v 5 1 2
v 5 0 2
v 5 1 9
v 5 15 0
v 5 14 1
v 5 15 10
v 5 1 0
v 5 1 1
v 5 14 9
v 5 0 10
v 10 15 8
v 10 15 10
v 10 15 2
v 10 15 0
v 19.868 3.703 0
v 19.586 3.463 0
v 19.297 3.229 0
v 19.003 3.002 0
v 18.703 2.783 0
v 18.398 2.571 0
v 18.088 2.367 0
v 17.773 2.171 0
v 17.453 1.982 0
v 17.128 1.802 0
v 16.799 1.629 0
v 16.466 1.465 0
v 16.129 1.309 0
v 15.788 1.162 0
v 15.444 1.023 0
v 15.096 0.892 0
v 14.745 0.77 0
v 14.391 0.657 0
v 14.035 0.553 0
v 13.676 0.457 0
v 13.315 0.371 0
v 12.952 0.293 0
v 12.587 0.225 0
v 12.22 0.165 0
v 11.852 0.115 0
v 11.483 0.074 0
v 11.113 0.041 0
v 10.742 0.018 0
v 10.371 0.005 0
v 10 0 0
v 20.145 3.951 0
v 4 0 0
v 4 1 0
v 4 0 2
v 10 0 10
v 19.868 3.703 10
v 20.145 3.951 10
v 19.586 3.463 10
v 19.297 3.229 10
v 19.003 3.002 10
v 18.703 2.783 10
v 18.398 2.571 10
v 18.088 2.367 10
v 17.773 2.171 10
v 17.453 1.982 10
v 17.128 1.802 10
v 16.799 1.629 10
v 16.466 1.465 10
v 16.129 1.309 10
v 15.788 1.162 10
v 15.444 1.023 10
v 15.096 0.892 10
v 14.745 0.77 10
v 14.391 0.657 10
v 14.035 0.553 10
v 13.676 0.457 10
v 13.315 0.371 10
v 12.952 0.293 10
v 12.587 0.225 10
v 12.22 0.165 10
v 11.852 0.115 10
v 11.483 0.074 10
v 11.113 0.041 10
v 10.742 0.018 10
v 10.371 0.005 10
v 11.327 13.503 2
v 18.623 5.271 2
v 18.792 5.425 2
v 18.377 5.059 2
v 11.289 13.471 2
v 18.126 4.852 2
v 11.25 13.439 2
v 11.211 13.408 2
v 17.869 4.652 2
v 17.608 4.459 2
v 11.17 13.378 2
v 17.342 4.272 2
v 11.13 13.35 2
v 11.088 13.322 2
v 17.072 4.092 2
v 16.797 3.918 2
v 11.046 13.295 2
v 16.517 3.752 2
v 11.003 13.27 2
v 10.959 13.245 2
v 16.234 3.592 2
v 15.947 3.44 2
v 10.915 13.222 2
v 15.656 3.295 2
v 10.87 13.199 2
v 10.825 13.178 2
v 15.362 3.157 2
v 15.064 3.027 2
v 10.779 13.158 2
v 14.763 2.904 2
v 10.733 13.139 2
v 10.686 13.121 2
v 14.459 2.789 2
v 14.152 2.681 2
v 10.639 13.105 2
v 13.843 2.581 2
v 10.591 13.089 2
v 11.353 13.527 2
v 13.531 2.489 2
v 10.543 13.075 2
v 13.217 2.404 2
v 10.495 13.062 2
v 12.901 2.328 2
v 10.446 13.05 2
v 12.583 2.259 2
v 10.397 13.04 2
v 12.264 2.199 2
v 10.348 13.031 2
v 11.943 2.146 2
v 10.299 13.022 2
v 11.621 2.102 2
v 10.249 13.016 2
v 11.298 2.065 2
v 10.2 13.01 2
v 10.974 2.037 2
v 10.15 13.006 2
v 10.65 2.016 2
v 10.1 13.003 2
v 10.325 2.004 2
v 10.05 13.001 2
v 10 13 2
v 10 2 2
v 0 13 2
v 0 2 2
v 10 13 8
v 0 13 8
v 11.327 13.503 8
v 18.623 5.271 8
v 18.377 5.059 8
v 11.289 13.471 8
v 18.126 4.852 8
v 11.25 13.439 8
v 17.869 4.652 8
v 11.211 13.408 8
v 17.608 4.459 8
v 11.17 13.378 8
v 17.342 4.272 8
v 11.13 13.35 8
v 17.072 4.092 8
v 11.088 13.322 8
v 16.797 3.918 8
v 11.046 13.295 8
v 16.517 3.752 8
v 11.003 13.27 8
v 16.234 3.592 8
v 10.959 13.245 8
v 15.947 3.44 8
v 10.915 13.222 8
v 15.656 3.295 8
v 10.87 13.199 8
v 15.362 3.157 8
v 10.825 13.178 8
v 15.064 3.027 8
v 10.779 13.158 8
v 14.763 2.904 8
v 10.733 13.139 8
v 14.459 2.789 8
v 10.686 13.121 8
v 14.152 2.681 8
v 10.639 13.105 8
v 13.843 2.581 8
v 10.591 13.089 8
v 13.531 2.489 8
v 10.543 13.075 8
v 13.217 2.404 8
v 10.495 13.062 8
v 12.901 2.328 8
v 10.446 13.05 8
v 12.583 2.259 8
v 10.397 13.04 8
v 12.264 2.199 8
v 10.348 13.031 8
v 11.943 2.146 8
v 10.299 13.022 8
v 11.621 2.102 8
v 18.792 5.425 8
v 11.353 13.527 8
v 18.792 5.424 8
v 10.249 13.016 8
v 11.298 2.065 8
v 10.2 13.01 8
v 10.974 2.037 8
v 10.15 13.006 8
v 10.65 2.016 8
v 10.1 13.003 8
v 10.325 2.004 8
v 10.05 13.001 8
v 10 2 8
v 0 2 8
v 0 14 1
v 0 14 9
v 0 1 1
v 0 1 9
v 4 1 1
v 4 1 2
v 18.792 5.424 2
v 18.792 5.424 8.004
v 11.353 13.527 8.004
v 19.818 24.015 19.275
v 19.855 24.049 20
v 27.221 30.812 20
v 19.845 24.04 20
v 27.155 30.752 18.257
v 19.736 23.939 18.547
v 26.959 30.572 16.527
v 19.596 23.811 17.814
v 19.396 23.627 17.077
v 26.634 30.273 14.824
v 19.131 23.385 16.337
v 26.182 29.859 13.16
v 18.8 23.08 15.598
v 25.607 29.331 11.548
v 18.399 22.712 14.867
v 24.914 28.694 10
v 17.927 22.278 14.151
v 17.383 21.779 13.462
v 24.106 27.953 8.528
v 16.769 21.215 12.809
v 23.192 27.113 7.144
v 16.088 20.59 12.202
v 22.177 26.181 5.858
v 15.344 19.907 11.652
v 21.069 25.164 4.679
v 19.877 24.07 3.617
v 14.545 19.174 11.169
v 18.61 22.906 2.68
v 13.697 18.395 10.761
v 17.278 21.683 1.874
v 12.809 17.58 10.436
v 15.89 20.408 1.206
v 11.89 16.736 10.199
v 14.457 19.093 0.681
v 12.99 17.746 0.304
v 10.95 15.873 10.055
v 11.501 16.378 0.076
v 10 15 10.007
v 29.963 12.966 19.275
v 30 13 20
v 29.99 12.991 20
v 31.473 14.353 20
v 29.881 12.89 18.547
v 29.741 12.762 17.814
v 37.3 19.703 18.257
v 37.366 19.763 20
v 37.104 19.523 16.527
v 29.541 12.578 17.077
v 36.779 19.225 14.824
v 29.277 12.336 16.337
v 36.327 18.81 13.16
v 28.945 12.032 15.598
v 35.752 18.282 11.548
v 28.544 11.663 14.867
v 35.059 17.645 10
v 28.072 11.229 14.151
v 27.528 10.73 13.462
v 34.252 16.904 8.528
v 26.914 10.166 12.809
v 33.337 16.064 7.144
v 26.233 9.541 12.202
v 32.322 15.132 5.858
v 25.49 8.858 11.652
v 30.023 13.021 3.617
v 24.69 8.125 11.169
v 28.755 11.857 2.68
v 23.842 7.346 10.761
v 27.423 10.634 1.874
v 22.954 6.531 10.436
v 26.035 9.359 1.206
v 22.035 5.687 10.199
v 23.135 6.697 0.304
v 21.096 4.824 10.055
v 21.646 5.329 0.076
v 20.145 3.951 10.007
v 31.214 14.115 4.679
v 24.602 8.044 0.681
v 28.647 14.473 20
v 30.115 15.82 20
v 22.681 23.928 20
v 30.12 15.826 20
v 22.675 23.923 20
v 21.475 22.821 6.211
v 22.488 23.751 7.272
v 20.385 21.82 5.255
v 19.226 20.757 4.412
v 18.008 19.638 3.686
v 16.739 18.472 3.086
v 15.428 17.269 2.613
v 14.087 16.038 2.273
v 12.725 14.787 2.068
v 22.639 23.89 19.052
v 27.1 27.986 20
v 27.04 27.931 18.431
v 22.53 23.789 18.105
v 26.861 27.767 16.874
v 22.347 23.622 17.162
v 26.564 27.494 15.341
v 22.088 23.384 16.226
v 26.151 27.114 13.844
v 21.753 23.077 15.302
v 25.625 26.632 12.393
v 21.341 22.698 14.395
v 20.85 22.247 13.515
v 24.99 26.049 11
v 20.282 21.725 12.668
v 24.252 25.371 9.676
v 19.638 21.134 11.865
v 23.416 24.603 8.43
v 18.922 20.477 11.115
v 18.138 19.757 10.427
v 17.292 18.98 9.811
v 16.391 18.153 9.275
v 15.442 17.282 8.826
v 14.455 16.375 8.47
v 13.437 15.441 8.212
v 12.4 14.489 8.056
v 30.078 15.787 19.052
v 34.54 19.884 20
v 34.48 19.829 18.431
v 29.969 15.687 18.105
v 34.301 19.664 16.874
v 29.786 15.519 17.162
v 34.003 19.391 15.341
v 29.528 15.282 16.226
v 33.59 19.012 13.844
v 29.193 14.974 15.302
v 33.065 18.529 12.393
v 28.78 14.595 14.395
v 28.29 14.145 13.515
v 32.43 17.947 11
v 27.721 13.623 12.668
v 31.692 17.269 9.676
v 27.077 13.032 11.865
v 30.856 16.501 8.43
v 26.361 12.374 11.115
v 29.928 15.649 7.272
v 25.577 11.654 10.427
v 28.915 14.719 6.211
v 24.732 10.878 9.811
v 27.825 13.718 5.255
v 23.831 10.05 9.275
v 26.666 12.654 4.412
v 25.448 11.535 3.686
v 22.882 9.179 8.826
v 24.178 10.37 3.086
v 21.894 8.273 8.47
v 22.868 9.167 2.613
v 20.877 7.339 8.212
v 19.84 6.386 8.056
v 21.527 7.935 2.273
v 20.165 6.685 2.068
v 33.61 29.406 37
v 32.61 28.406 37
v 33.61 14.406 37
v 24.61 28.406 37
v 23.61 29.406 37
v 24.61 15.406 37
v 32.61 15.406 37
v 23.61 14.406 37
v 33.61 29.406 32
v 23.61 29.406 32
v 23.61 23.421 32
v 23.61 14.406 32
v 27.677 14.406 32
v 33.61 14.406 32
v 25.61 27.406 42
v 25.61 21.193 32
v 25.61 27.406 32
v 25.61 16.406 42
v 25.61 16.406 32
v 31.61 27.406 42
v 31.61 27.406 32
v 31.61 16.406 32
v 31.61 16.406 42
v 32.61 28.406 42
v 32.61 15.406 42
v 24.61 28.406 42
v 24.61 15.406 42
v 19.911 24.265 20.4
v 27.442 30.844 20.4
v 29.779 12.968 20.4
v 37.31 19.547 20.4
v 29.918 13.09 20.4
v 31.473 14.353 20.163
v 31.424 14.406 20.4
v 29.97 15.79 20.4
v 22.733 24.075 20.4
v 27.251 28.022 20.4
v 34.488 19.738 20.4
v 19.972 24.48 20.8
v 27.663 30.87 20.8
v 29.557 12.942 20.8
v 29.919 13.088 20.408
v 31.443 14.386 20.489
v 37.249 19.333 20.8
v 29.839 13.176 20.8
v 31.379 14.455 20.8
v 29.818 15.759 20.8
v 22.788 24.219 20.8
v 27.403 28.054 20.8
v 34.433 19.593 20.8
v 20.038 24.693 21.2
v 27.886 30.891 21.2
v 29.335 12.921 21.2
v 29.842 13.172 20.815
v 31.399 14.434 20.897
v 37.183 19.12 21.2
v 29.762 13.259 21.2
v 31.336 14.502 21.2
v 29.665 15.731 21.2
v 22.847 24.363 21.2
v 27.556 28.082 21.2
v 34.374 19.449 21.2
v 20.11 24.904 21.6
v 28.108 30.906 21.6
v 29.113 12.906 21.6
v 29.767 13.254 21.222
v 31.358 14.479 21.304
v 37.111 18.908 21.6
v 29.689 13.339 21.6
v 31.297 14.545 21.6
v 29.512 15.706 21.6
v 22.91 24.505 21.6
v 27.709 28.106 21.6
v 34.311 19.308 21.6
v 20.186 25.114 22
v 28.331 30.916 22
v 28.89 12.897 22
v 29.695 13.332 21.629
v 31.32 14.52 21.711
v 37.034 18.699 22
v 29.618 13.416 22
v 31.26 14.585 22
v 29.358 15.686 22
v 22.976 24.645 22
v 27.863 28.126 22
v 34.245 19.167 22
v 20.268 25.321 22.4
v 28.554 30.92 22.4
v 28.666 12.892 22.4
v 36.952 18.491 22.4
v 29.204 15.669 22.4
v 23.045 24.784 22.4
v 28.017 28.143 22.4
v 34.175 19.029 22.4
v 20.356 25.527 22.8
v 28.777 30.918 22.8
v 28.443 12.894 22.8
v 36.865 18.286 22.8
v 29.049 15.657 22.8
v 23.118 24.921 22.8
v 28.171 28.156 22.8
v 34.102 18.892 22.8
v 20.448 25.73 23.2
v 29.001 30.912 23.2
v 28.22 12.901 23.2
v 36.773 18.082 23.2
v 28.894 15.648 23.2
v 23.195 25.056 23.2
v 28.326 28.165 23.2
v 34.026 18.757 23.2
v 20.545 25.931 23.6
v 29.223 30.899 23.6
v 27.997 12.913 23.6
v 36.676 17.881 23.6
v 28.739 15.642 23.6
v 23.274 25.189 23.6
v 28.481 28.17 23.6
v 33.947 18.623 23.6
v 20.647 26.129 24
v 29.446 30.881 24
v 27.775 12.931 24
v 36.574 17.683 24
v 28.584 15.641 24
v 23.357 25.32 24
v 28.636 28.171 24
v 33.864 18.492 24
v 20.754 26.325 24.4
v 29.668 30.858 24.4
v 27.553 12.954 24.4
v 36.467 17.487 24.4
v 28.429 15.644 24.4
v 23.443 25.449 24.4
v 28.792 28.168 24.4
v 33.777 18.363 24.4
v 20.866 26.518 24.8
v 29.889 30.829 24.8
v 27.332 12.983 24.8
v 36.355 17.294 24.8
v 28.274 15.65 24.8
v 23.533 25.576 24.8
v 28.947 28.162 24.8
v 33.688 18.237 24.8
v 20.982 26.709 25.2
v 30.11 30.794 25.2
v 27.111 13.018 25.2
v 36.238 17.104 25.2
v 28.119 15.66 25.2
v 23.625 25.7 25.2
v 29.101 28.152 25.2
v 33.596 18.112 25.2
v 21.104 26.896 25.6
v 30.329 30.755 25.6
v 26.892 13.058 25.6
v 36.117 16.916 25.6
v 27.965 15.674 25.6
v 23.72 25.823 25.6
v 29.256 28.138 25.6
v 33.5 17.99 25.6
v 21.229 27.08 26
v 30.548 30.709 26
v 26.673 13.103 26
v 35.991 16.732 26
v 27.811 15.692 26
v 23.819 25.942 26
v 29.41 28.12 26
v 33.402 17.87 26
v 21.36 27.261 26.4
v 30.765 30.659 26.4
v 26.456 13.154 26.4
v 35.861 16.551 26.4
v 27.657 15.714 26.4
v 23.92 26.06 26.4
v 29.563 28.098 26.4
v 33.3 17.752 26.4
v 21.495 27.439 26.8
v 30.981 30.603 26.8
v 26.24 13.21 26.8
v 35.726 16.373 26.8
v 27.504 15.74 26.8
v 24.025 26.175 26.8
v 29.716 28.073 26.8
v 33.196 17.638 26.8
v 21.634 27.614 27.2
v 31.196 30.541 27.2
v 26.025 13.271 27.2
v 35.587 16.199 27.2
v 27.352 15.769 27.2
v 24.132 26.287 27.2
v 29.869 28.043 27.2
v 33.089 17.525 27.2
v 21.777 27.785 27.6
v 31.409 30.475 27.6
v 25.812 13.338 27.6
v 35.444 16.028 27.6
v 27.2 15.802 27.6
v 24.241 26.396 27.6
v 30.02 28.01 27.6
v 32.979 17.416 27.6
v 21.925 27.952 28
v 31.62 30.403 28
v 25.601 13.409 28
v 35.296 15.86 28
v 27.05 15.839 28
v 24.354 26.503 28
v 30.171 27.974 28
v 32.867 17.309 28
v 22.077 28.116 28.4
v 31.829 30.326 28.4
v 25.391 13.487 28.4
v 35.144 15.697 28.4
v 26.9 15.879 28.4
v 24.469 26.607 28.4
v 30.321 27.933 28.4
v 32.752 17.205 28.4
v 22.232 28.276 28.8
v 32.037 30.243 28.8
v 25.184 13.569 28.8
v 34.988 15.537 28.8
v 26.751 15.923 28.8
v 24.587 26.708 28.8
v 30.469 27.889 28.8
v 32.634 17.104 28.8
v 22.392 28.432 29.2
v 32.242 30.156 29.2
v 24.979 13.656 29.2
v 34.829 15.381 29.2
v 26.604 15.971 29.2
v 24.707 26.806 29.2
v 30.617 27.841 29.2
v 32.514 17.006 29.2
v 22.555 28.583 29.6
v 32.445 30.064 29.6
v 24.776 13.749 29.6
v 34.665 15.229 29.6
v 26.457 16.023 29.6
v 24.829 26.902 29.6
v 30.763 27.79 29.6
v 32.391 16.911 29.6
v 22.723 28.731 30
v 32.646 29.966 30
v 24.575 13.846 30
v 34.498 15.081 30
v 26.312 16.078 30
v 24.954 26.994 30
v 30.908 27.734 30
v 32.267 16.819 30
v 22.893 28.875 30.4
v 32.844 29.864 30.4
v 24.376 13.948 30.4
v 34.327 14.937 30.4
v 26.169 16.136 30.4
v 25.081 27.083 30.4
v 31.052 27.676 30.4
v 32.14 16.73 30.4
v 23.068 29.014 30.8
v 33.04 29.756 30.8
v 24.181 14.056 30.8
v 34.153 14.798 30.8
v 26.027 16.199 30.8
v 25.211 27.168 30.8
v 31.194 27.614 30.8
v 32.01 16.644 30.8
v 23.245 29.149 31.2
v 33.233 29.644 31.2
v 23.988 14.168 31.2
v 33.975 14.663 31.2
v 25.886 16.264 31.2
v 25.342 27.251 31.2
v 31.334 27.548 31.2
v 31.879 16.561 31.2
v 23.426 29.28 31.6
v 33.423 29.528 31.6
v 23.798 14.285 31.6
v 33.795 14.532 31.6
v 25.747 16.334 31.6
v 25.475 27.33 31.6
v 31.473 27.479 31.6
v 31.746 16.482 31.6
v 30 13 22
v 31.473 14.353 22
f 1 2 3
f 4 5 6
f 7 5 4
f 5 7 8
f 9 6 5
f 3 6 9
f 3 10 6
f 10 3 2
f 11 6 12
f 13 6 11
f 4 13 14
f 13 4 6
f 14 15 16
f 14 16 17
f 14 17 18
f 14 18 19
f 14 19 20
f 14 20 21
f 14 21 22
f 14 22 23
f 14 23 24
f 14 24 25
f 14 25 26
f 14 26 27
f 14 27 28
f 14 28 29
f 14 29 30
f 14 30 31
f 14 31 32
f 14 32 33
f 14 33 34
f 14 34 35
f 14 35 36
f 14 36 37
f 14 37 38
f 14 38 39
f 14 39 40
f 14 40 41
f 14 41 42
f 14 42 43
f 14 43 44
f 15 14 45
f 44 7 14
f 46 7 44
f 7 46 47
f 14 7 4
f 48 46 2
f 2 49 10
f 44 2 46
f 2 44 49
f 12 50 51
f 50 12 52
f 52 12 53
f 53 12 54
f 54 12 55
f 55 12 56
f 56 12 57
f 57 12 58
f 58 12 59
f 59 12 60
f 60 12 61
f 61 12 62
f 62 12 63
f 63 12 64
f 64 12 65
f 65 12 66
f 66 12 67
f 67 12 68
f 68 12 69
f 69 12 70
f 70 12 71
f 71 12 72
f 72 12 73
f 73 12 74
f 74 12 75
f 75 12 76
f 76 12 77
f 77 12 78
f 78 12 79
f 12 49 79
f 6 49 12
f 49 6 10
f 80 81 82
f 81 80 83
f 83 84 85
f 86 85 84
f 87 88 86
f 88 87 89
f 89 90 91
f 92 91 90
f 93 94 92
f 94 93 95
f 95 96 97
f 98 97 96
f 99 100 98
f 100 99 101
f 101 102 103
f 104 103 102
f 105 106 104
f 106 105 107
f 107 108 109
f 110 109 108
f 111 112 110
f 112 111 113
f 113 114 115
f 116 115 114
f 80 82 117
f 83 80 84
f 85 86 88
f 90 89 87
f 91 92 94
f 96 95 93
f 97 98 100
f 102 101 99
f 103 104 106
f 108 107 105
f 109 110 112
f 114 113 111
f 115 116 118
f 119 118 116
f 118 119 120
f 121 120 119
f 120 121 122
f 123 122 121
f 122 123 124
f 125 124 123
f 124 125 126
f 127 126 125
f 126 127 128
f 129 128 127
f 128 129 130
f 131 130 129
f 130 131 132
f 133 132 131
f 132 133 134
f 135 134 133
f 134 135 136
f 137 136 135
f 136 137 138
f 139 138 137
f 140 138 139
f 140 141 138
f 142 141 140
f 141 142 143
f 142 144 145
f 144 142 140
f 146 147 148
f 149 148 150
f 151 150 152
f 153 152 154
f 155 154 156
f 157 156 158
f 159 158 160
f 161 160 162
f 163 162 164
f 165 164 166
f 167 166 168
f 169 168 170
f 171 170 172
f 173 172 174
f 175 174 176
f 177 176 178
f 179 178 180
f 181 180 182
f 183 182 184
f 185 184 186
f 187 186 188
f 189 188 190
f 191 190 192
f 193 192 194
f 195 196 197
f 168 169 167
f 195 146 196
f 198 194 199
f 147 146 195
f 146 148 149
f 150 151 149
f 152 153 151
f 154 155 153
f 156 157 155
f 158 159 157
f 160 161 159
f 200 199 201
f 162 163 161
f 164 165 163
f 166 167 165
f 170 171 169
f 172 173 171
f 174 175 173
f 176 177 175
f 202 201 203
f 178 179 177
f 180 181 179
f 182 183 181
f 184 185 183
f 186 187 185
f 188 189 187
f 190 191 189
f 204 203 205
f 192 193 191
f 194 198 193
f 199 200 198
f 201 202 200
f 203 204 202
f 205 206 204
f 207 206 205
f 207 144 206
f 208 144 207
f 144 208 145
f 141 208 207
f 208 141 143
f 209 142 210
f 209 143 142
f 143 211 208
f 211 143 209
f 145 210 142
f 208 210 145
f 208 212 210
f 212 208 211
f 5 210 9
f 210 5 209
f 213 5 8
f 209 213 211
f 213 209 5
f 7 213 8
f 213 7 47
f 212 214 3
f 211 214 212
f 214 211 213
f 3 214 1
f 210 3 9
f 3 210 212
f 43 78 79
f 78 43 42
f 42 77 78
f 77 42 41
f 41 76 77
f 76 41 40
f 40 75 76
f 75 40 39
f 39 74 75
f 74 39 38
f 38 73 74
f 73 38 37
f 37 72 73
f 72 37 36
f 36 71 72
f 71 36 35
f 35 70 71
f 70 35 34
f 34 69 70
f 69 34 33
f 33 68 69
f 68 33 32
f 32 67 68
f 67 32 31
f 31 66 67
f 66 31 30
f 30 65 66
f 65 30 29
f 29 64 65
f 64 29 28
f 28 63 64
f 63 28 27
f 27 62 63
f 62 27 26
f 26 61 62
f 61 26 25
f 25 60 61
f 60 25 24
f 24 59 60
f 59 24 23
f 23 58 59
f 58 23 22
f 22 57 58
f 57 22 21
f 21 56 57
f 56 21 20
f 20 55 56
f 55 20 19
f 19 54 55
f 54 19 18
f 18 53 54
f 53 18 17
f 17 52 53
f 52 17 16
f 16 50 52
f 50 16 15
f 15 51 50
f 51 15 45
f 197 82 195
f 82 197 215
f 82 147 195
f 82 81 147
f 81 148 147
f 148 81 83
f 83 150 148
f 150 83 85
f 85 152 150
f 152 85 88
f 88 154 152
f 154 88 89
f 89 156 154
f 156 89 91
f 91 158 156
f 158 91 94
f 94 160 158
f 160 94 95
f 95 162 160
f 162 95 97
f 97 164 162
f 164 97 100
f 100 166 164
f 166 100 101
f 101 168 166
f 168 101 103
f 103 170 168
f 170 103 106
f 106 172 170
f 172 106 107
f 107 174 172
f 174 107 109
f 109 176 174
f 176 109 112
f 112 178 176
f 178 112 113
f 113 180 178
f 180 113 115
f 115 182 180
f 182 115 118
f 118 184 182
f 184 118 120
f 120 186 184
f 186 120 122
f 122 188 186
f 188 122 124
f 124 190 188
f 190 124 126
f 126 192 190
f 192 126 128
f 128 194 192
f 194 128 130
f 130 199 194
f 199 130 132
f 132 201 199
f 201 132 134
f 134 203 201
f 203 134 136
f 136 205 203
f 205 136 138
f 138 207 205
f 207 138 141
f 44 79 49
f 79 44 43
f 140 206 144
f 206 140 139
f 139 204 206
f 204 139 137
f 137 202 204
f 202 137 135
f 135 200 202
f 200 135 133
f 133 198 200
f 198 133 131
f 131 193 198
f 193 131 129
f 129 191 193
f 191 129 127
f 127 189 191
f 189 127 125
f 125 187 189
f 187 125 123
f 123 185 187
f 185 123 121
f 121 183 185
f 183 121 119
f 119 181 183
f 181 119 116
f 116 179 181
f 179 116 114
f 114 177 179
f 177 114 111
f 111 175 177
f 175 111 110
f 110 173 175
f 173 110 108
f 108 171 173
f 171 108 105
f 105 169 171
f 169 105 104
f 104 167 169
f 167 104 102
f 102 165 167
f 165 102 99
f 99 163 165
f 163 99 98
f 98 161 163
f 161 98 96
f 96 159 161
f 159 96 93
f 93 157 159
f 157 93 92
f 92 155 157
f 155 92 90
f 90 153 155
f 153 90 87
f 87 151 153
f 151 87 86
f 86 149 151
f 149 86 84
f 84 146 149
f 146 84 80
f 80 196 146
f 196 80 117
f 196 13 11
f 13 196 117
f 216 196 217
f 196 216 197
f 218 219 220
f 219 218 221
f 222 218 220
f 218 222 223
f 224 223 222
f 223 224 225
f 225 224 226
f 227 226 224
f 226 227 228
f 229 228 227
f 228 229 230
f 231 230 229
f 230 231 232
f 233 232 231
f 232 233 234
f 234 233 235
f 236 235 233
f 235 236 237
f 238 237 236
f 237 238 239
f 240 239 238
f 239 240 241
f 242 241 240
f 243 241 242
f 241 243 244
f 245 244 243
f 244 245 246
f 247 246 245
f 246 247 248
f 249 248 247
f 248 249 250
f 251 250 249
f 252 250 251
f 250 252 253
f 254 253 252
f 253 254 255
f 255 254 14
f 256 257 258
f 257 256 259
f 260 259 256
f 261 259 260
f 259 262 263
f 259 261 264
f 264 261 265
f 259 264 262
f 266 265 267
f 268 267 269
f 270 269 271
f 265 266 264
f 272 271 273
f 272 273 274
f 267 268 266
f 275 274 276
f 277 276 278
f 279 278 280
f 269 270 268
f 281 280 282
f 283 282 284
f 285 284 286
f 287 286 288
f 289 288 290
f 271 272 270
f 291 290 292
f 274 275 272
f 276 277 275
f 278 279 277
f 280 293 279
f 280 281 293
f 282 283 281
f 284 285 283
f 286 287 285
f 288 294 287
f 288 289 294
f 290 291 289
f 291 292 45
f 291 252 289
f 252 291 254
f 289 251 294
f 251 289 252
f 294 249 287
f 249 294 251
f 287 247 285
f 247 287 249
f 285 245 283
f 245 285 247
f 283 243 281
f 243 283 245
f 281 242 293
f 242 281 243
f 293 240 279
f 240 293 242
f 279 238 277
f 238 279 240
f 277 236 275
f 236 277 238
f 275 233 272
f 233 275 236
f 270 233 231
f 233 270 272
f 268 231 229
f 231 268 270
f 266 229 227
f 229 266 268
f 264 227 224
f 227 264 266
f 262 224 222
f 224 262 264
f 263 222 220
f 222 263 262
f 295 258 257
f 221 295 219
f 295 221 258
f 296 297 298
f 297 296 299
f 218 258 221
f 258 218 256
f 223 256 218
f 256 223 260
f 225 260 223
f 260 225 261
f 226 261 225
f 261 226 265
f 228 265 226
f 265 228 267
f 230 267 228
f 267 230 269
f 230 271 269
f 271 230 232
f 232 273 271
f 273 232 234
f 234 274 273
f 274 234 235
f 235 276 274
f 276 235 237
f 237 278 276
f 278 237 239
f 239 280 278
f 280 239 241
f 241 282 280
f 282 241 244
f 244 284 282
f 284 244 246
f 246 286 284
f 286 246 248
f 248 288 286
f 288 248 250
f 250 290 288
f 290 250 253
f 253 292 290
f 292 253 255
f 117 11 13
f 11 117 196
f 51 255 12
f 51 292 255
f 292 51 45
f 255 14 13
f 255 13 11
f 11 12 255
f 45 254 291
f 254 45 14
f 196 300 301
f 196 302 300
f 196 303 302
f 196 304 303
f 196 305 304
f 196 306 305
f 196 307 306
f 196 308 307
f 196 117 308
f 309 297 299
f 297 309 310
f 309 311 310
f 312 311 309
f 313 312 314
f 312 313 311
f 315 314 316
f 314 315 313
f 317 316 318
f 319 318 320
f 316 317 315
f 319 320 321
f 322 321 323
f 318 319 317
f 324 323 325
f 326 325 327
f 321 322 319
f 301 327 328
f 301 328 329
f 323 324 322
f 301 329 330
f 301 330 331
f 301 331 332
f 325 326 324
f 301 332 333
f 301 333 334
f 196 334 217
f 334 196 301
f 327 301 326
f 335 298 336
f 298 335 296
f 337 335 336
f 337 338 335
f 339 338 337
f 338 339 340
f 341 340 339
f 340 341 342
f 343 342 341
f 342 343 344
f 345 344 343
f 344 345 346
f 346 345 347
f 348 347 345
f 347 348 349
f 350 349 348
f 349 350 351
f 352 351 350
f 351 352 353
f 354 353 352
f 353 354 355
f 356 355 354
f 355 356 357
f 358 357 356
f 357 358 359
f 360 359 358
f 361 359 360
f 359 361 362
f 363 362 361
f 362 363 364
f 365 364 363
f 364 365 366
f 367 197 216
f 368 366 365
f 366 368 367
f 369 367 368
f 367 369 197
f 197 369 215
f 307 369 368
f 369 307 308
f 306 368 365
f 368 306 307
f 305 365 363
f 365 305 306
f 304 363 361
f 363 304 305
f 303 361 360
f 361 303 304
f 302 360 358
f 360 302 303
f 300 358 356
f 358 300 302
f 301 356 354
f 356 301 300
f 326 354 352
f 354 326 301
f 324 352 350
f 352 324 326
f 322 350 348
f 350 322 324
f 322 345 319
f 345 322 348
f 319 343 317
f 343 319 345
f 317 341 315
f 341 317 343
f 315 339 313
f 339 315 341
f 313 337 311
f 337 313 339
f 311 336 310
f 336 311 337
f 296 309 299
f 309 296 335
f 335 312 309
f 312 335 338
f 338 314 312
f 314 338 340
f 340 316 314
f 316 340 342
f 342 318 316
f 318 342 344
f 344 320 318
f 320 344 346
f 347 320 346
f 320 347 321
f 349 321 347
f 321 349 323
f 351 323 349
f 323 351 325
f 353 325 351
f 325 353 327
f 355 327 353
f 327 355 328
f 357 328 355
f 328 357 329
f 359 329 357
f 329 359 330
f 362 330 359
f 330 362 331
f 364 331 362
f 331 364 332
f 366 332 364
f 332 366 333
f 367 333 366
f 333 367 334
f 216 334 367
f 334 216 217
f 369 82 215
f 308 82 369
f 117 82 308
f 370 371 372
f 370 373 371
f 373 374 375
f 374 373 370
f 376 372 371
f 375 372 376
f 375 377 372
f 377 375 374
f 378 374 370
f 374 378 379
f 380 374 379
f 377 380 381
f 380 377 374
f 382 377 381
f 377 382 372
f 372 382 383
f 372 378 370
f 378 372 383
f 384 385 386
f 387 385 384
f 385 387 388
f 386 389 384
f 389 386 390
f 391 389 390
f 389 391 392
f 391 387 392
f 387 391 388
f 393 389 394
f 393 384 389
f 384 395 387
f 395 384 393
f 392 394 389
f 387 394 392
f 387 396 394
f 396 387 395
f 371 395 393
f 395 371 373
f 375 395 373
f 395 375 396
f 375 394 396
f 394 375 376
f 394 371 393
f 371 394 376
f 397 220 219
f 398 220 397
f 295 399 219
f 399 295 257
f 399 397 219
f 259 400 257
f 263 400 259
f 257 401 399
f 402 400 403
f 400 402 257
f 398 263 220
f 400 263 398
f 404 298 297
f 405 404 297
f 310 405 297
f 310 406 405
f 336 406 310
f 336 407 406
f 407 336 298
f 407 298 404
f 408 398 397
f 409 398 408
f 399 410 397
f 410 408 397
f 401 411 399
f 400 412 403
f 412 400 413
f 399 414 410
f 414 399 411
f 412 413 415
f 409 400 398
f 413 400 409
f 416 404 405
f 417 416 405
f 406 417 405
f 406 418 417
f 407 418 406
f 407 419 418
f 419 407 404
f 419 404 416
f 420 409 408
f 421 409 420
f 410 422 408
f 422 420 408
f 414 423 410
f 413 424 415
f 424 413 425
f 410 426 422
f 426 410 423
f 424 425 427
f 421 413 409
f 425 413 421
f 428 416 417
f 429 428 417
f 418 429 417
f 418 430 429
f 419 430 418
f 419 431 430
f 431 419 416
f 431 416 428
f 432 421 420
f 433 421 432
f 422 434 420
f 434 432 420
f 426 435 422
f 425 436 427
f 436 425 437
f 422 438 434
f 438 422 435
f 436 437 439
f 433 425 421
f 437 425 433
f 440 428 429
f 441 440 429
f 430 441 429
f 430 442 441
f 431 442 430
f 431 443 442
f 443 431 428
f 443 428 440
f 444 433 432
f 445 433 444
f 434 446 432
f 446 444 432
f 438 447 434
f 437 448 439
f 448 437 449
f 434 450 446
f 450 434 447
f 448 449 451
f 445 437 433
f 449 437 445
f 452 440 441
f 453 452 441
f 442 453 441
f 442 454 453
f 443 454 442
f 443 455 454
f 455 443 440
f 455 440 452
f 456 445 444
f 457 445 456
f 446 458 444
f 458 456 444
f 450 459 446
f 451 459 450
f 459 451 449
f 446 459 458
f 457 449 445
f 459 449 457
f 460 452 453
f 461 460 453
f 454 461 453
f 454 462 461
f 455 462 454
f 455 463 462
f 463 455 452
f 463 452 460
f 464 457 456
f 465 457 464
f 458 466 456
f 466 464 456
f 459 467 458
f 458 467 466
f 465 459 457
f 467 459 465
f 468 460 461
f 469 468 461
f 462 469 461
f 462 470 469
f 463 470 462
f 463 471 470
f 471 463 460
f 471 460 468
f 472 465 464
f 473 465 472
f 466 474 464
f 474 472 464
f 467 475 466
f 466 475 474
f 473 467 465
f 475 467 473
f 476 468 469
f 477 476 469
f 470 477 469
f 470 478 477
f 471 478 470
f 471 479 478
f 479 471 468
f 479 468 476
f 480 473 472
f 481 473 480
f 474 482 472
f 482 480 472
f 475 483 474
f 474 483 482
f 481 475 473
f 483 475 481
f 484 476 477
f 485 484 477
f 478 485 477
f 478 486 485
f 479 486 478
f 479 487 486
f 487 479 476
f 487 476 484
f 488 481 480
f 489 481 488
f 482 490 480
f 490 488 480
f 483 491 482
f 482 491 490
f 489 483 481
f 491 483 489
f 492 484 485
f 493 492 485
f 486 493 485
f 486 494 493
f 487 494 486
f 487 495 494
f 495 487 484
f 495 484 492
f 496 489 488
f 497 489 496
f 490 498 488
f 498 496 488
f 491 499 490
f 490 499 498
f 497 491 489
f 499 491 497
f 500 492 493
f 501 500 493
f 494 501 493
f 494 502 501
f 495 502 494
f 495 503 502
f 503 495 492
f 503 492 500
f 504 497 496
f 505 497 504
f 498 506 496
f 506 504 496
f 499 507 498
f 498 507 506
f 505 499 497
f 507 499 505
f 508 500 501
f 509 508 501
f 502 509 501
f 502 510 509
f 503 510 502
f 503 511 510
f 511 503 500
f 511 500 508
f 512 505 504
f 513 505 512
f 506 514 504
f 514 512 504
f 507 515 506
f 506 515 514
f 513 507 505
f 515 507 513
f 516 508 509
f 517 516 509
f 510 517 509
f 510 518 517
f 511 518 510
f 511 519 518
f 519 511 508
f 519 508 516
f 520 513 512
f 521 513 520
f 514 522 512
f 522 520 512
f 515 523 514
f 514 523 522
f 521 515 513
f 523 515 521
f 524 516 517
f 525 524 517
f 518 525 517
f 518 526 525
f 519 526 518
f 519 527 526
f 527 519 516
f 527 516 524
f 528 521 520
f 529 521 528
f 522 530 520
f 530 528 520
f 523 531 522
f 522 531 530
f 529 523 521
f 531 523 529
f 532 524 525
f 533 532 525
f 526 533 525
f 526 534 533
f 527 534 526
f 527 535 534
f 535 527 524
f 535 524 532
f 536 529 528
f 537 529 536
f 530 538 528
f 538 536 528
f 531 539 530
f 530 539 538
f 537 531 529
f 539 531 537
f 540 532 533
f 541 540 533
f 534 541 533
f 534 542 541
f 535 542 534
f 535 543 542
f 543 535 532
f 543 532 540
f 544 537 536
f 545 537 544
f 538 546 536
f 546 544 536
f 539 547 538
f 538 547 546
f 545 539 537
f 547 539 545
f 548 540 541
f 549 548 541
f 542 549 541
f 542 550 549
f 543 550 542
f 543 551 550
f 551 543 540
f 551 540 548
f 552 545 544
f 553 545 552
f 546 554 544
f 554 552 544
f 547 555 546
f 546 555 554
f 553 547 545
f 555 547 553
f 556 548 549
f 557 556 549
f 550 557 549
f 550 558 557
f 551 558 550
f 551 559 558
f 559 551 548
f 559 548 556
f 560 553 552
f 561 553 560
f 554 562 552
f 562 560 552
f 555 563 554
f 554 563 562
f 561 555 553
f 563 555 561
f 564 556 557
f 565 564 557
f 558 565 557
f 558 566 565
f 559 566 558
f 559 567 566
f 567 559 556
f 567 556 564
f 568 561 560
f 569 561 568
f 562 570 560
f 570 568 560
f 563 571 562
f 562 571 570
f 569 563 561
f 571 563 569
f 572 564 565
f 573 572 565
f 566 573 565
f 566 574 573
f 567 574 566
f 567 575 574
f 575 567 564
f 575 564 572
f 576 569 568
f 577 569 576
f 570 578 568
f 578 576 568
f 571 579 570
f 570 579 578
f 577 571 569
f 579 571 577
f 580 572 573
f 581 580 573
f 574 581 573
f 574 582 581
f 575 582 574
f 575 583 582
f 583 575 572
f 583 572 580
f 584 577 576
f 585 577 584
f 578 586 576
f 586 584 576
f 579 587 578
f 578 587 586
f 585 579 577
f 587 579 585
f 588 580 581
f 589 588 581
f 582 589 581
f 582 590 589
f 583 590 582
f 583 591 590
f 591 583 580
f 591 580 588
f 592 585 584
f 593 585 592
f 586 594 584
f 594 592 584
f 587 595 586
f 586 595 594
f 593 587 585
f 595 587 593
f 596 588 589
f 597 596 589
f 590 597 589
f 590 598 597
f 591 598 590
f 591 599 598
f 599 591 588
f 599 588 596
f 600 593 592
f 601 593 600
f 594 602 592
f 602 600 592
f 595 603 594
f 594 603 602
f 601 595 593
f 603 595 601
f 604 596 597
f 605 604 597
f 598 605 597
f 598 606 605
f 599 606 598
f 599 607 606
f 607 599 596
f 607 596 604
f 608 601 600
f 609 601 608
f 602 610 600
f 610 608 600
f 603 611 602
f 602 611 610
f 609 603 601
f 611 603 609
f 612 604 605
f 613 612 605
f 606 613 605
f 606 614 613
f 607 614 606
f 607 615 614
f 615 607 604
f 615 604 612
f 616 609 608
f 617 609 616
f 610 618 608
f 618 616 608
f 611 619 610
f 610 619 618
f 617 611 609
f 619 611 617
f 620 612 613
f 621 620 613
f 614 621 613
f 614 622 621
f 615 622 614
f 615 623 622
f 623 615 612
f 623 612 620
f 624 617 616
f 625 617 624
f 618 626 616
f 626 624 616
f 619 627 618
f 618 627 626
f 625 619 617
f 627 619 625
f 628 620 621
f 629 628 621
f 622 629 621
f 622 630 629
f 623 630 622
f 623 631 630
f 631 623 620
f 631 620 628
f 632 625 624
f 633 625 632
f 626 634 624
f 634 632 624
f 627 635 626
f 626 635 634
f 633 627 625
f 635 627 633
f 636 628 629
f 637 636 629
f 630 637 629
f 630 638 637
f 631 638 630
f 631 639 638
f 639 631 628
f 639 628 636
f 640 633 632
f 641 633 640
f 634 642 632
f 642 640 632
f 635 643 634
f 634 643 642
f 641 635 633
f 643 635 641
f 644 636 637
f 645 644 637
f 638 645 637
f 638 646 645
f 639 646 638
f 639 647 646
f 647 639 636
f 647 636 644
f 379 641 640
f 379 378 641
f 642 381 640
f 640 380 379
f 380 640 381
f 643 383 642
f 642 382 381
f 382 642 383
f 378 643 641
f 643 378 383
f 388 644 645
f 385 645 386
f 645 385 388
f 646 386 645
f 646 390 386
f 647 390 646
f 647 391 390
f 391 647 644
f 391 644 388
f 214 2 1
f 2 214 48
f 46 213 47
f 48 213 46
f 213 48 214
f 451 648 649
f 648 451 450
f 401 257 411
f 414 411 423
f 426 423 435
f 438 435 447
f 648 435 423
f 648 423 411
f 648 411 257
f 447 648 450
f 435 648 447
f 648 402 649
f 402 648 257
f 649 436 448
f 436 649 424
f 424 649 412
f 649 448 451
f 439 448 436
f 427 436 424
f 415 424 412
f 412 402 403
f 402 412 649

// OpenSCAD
// file: utils.scad
function translate2d(v, list) = [for (p = list) [p[0] + v[0], p[1] + v[1]]];

function _circle_perimeter(r = 1, a0 = 0, a1 = 360) =
	concat([for (i = [0:1:$fn-1])
			let(a = a0 + (a1-a0)/$fn*i) r*[cos(a), sin(a)]],
		[r*[cos(a1), sin(a1)]]);

function circle_perimeter(r = 1, a0 = 0, a1 = 360) =
	(a0 < a1) ?
		_circle_perimeter(r=r, a0=a0, a1=a1) :
		reverse(_circle_perimeter(r=r, a0=a1, a1=a0));

module show_pnt(p, txt="")
{
	#translate(p) {
		sphere(0.1, $fn=20);
		rotate([45, 0, 0])
		linear_extrude(1)
		text(
			//text = str(txt, " - (", p[0], ", ", p[1], ", ", p[2], ")"),
			text = txt,
			size = 1,
			halign="right"
		);
	}
}

function _animate(start, end) =
	end - abs(2*(end-start)*($t-0.5));
function animate(start, end, bounce = true) =
	(!bounce) ? start + (end-start)*$t :
		(start < end)? _animate(start, end) :
		-_animate(start, end) + start + end;
// main file
use <utils.scad>

$fn = 30;
$fa = 5;

module fc_arc_secc(width, height, thick)
{
	function ellipse_f(b, a, ang = 360) = concat(
		[for (x=[0:$fa:ang-$fa/2]) [a*cos(x), b*sin(x)]],
		[[a*cos(ang), b*sin(ang)]]
	);

	ellipse = concat(ellipse_f(width, height, 90), [[0, 0]]);
	mayor = (width > height)? width : height;

	translate([0, height, 0]) rotate([0, 0, -90])
	intersection() {
		square([mayor, mayor], center = false);
		difference() {
			polygon(ellipse);
			offset(r=-thick) polygon(ellipse_f(width, height));
		}
	}
}

module fc_square_secc(conn_size, thick)
{
	difference() {
		square([conn_size[0], conn_size[1]], center=true);
		square([conn_size[0]-thick*2, conn_size[1]-thick*2], center=true);
	}
}

module fc_arc(width, height, conn_size, thick)
{
	t  = thick*2;
	tm = thick;

	translate([0, conn_size[1], 0]) rotate([90, 0, 0])
	difference() {
		linear_extrude(conn_size[1])
			fc_arc_secc(width, height, conn_size[0]);
		translate([0, 0, tm])
			linear_extrude(conn_size[1] - t)
				translate([0, tm, 0])
					fc_arc_secc(
						width  - tm,
						height - tm,
						conn_size[0] - t
					);
	}

	// Move coordinate center
	translate([width - conn_size[0], 0, height])
		children();
}

module fc_top_elbow(conn_size, height, thick, angle)
{
	trans = [conn_size[0]/2, conn_size[1]/2, 0];
	translate(trans)
		linear_extrude(height = height, twist = angle, slices = $fn)
			fc_square_secc(conn_size, thick);

	translate(trans + [0, 0, height])
		rotate([0, 0, -angle])
			translate(-trans)
				children(0);
}

module fc_bot_elbow(rad, height, thick, angle)
{
	a     = abs(angle);
	neg   = angle < 0;
	rot   = [0, 0, neg? angle : 180];
	trans = [0, neg? 0 : rad];


	circle_a = concat(
		circle_perimeter(r = rad, a0 = 90, a1 = 90+a),
		[[0, 0]]
	);
	circle_b = concat(
		circle_perimeter(r = rad - thick, a0 = 90, a1 = 90+a*1.01),
		[[0, 0]]
	);
	circle_c = concat(
		circle_perimeter(r = thick, a0 = 90, a1 = 90+a*1.01),
		[[0, 0]]
	);

	translate(trans) rotate(rot)
		union() {
			linear_extrude(height) {
				difference() {
					polygon(circle_a);
					difference() {
						polygon(circle_b);
						polygon(circle_c);
					}
				}
			}
			linear_extrude(thick)
				polygon(circle_a);
			translate([0, 0, height-thick])
				linear_extrude(thick)
					polygon(circle_a);
		}

	// Moving coordinate center
	translate(neg? [0, 0, 0] : [rad*sin(a), rad - rad*cos(a), 0])
		rotate([0, 0, angle])
			children(0);
}

module fc_conn(conn_size, width, thick)
{
	w = width/2;
	cs2 = conn_size - [1, 1]*thick;

	union() {
		translate([conn_size[0]/2, conn_size[1]/2, 0]) {
			linear_extrude(w)
				fc_square_secc(conn_size, thick);
			translate([0, 0, w])
				linear_extrude(w)
					fc_square_secc(cs2, thick/2);
		}
		if ($children >= 1) rotate([0, 90, 0])         children(0);
		if ($children >= 2) translate([0, 0, width/2]) children(1);
	}
}

module fan_connector(conn_point, conn_size, conn_depth_a, conn_depth_b, thick)
{
	conn_depth = 10;

	pa        = [conn_depth, conn_size[1]];
	pb        = [conn_point[0], conn_point[1]];
	point_d   = pb - pa;
	norm_d    = norm(point_d);
	alpha     = atan2(point_d[1], point_d[0]);
	beta      = acos(conn_size[1]/norm_d);
	angle     = 90 - beta + alpha;
	arc_width = sqrt(pow(norm_d,2) - pow(conn_size[1],2)) + conn_size[0];

	echo(point_d);
	echo(angle);

	translate([10, 0, 0]) rotate([0, -90, 0])
	fc_conn(conn_size, conn_depth, thick) {
		fc_bot_elbow(conn_size[1], conn_size[0], thick, angle)
		fc_arc(arc_width, conn_point[2], conn_size, thick)
		fc_top_elbow(conn_size, conn_depth_a, thick, angle)
			fc_conn(conn_size, conn_depth, thick);

		color("red") cube([2, 1, 1]);
	}

	color("red") translate(conn_point) rotate(angle) cube([2, 2, 2]);
	//translate(pa) cube();
}

// TODO: Negative numbers
//fan_connector([30, -10, 20], [10, 15], 12, 10, 2);
fan_connector([30, 13, 20], [10, 15], 12, 10, 2);
